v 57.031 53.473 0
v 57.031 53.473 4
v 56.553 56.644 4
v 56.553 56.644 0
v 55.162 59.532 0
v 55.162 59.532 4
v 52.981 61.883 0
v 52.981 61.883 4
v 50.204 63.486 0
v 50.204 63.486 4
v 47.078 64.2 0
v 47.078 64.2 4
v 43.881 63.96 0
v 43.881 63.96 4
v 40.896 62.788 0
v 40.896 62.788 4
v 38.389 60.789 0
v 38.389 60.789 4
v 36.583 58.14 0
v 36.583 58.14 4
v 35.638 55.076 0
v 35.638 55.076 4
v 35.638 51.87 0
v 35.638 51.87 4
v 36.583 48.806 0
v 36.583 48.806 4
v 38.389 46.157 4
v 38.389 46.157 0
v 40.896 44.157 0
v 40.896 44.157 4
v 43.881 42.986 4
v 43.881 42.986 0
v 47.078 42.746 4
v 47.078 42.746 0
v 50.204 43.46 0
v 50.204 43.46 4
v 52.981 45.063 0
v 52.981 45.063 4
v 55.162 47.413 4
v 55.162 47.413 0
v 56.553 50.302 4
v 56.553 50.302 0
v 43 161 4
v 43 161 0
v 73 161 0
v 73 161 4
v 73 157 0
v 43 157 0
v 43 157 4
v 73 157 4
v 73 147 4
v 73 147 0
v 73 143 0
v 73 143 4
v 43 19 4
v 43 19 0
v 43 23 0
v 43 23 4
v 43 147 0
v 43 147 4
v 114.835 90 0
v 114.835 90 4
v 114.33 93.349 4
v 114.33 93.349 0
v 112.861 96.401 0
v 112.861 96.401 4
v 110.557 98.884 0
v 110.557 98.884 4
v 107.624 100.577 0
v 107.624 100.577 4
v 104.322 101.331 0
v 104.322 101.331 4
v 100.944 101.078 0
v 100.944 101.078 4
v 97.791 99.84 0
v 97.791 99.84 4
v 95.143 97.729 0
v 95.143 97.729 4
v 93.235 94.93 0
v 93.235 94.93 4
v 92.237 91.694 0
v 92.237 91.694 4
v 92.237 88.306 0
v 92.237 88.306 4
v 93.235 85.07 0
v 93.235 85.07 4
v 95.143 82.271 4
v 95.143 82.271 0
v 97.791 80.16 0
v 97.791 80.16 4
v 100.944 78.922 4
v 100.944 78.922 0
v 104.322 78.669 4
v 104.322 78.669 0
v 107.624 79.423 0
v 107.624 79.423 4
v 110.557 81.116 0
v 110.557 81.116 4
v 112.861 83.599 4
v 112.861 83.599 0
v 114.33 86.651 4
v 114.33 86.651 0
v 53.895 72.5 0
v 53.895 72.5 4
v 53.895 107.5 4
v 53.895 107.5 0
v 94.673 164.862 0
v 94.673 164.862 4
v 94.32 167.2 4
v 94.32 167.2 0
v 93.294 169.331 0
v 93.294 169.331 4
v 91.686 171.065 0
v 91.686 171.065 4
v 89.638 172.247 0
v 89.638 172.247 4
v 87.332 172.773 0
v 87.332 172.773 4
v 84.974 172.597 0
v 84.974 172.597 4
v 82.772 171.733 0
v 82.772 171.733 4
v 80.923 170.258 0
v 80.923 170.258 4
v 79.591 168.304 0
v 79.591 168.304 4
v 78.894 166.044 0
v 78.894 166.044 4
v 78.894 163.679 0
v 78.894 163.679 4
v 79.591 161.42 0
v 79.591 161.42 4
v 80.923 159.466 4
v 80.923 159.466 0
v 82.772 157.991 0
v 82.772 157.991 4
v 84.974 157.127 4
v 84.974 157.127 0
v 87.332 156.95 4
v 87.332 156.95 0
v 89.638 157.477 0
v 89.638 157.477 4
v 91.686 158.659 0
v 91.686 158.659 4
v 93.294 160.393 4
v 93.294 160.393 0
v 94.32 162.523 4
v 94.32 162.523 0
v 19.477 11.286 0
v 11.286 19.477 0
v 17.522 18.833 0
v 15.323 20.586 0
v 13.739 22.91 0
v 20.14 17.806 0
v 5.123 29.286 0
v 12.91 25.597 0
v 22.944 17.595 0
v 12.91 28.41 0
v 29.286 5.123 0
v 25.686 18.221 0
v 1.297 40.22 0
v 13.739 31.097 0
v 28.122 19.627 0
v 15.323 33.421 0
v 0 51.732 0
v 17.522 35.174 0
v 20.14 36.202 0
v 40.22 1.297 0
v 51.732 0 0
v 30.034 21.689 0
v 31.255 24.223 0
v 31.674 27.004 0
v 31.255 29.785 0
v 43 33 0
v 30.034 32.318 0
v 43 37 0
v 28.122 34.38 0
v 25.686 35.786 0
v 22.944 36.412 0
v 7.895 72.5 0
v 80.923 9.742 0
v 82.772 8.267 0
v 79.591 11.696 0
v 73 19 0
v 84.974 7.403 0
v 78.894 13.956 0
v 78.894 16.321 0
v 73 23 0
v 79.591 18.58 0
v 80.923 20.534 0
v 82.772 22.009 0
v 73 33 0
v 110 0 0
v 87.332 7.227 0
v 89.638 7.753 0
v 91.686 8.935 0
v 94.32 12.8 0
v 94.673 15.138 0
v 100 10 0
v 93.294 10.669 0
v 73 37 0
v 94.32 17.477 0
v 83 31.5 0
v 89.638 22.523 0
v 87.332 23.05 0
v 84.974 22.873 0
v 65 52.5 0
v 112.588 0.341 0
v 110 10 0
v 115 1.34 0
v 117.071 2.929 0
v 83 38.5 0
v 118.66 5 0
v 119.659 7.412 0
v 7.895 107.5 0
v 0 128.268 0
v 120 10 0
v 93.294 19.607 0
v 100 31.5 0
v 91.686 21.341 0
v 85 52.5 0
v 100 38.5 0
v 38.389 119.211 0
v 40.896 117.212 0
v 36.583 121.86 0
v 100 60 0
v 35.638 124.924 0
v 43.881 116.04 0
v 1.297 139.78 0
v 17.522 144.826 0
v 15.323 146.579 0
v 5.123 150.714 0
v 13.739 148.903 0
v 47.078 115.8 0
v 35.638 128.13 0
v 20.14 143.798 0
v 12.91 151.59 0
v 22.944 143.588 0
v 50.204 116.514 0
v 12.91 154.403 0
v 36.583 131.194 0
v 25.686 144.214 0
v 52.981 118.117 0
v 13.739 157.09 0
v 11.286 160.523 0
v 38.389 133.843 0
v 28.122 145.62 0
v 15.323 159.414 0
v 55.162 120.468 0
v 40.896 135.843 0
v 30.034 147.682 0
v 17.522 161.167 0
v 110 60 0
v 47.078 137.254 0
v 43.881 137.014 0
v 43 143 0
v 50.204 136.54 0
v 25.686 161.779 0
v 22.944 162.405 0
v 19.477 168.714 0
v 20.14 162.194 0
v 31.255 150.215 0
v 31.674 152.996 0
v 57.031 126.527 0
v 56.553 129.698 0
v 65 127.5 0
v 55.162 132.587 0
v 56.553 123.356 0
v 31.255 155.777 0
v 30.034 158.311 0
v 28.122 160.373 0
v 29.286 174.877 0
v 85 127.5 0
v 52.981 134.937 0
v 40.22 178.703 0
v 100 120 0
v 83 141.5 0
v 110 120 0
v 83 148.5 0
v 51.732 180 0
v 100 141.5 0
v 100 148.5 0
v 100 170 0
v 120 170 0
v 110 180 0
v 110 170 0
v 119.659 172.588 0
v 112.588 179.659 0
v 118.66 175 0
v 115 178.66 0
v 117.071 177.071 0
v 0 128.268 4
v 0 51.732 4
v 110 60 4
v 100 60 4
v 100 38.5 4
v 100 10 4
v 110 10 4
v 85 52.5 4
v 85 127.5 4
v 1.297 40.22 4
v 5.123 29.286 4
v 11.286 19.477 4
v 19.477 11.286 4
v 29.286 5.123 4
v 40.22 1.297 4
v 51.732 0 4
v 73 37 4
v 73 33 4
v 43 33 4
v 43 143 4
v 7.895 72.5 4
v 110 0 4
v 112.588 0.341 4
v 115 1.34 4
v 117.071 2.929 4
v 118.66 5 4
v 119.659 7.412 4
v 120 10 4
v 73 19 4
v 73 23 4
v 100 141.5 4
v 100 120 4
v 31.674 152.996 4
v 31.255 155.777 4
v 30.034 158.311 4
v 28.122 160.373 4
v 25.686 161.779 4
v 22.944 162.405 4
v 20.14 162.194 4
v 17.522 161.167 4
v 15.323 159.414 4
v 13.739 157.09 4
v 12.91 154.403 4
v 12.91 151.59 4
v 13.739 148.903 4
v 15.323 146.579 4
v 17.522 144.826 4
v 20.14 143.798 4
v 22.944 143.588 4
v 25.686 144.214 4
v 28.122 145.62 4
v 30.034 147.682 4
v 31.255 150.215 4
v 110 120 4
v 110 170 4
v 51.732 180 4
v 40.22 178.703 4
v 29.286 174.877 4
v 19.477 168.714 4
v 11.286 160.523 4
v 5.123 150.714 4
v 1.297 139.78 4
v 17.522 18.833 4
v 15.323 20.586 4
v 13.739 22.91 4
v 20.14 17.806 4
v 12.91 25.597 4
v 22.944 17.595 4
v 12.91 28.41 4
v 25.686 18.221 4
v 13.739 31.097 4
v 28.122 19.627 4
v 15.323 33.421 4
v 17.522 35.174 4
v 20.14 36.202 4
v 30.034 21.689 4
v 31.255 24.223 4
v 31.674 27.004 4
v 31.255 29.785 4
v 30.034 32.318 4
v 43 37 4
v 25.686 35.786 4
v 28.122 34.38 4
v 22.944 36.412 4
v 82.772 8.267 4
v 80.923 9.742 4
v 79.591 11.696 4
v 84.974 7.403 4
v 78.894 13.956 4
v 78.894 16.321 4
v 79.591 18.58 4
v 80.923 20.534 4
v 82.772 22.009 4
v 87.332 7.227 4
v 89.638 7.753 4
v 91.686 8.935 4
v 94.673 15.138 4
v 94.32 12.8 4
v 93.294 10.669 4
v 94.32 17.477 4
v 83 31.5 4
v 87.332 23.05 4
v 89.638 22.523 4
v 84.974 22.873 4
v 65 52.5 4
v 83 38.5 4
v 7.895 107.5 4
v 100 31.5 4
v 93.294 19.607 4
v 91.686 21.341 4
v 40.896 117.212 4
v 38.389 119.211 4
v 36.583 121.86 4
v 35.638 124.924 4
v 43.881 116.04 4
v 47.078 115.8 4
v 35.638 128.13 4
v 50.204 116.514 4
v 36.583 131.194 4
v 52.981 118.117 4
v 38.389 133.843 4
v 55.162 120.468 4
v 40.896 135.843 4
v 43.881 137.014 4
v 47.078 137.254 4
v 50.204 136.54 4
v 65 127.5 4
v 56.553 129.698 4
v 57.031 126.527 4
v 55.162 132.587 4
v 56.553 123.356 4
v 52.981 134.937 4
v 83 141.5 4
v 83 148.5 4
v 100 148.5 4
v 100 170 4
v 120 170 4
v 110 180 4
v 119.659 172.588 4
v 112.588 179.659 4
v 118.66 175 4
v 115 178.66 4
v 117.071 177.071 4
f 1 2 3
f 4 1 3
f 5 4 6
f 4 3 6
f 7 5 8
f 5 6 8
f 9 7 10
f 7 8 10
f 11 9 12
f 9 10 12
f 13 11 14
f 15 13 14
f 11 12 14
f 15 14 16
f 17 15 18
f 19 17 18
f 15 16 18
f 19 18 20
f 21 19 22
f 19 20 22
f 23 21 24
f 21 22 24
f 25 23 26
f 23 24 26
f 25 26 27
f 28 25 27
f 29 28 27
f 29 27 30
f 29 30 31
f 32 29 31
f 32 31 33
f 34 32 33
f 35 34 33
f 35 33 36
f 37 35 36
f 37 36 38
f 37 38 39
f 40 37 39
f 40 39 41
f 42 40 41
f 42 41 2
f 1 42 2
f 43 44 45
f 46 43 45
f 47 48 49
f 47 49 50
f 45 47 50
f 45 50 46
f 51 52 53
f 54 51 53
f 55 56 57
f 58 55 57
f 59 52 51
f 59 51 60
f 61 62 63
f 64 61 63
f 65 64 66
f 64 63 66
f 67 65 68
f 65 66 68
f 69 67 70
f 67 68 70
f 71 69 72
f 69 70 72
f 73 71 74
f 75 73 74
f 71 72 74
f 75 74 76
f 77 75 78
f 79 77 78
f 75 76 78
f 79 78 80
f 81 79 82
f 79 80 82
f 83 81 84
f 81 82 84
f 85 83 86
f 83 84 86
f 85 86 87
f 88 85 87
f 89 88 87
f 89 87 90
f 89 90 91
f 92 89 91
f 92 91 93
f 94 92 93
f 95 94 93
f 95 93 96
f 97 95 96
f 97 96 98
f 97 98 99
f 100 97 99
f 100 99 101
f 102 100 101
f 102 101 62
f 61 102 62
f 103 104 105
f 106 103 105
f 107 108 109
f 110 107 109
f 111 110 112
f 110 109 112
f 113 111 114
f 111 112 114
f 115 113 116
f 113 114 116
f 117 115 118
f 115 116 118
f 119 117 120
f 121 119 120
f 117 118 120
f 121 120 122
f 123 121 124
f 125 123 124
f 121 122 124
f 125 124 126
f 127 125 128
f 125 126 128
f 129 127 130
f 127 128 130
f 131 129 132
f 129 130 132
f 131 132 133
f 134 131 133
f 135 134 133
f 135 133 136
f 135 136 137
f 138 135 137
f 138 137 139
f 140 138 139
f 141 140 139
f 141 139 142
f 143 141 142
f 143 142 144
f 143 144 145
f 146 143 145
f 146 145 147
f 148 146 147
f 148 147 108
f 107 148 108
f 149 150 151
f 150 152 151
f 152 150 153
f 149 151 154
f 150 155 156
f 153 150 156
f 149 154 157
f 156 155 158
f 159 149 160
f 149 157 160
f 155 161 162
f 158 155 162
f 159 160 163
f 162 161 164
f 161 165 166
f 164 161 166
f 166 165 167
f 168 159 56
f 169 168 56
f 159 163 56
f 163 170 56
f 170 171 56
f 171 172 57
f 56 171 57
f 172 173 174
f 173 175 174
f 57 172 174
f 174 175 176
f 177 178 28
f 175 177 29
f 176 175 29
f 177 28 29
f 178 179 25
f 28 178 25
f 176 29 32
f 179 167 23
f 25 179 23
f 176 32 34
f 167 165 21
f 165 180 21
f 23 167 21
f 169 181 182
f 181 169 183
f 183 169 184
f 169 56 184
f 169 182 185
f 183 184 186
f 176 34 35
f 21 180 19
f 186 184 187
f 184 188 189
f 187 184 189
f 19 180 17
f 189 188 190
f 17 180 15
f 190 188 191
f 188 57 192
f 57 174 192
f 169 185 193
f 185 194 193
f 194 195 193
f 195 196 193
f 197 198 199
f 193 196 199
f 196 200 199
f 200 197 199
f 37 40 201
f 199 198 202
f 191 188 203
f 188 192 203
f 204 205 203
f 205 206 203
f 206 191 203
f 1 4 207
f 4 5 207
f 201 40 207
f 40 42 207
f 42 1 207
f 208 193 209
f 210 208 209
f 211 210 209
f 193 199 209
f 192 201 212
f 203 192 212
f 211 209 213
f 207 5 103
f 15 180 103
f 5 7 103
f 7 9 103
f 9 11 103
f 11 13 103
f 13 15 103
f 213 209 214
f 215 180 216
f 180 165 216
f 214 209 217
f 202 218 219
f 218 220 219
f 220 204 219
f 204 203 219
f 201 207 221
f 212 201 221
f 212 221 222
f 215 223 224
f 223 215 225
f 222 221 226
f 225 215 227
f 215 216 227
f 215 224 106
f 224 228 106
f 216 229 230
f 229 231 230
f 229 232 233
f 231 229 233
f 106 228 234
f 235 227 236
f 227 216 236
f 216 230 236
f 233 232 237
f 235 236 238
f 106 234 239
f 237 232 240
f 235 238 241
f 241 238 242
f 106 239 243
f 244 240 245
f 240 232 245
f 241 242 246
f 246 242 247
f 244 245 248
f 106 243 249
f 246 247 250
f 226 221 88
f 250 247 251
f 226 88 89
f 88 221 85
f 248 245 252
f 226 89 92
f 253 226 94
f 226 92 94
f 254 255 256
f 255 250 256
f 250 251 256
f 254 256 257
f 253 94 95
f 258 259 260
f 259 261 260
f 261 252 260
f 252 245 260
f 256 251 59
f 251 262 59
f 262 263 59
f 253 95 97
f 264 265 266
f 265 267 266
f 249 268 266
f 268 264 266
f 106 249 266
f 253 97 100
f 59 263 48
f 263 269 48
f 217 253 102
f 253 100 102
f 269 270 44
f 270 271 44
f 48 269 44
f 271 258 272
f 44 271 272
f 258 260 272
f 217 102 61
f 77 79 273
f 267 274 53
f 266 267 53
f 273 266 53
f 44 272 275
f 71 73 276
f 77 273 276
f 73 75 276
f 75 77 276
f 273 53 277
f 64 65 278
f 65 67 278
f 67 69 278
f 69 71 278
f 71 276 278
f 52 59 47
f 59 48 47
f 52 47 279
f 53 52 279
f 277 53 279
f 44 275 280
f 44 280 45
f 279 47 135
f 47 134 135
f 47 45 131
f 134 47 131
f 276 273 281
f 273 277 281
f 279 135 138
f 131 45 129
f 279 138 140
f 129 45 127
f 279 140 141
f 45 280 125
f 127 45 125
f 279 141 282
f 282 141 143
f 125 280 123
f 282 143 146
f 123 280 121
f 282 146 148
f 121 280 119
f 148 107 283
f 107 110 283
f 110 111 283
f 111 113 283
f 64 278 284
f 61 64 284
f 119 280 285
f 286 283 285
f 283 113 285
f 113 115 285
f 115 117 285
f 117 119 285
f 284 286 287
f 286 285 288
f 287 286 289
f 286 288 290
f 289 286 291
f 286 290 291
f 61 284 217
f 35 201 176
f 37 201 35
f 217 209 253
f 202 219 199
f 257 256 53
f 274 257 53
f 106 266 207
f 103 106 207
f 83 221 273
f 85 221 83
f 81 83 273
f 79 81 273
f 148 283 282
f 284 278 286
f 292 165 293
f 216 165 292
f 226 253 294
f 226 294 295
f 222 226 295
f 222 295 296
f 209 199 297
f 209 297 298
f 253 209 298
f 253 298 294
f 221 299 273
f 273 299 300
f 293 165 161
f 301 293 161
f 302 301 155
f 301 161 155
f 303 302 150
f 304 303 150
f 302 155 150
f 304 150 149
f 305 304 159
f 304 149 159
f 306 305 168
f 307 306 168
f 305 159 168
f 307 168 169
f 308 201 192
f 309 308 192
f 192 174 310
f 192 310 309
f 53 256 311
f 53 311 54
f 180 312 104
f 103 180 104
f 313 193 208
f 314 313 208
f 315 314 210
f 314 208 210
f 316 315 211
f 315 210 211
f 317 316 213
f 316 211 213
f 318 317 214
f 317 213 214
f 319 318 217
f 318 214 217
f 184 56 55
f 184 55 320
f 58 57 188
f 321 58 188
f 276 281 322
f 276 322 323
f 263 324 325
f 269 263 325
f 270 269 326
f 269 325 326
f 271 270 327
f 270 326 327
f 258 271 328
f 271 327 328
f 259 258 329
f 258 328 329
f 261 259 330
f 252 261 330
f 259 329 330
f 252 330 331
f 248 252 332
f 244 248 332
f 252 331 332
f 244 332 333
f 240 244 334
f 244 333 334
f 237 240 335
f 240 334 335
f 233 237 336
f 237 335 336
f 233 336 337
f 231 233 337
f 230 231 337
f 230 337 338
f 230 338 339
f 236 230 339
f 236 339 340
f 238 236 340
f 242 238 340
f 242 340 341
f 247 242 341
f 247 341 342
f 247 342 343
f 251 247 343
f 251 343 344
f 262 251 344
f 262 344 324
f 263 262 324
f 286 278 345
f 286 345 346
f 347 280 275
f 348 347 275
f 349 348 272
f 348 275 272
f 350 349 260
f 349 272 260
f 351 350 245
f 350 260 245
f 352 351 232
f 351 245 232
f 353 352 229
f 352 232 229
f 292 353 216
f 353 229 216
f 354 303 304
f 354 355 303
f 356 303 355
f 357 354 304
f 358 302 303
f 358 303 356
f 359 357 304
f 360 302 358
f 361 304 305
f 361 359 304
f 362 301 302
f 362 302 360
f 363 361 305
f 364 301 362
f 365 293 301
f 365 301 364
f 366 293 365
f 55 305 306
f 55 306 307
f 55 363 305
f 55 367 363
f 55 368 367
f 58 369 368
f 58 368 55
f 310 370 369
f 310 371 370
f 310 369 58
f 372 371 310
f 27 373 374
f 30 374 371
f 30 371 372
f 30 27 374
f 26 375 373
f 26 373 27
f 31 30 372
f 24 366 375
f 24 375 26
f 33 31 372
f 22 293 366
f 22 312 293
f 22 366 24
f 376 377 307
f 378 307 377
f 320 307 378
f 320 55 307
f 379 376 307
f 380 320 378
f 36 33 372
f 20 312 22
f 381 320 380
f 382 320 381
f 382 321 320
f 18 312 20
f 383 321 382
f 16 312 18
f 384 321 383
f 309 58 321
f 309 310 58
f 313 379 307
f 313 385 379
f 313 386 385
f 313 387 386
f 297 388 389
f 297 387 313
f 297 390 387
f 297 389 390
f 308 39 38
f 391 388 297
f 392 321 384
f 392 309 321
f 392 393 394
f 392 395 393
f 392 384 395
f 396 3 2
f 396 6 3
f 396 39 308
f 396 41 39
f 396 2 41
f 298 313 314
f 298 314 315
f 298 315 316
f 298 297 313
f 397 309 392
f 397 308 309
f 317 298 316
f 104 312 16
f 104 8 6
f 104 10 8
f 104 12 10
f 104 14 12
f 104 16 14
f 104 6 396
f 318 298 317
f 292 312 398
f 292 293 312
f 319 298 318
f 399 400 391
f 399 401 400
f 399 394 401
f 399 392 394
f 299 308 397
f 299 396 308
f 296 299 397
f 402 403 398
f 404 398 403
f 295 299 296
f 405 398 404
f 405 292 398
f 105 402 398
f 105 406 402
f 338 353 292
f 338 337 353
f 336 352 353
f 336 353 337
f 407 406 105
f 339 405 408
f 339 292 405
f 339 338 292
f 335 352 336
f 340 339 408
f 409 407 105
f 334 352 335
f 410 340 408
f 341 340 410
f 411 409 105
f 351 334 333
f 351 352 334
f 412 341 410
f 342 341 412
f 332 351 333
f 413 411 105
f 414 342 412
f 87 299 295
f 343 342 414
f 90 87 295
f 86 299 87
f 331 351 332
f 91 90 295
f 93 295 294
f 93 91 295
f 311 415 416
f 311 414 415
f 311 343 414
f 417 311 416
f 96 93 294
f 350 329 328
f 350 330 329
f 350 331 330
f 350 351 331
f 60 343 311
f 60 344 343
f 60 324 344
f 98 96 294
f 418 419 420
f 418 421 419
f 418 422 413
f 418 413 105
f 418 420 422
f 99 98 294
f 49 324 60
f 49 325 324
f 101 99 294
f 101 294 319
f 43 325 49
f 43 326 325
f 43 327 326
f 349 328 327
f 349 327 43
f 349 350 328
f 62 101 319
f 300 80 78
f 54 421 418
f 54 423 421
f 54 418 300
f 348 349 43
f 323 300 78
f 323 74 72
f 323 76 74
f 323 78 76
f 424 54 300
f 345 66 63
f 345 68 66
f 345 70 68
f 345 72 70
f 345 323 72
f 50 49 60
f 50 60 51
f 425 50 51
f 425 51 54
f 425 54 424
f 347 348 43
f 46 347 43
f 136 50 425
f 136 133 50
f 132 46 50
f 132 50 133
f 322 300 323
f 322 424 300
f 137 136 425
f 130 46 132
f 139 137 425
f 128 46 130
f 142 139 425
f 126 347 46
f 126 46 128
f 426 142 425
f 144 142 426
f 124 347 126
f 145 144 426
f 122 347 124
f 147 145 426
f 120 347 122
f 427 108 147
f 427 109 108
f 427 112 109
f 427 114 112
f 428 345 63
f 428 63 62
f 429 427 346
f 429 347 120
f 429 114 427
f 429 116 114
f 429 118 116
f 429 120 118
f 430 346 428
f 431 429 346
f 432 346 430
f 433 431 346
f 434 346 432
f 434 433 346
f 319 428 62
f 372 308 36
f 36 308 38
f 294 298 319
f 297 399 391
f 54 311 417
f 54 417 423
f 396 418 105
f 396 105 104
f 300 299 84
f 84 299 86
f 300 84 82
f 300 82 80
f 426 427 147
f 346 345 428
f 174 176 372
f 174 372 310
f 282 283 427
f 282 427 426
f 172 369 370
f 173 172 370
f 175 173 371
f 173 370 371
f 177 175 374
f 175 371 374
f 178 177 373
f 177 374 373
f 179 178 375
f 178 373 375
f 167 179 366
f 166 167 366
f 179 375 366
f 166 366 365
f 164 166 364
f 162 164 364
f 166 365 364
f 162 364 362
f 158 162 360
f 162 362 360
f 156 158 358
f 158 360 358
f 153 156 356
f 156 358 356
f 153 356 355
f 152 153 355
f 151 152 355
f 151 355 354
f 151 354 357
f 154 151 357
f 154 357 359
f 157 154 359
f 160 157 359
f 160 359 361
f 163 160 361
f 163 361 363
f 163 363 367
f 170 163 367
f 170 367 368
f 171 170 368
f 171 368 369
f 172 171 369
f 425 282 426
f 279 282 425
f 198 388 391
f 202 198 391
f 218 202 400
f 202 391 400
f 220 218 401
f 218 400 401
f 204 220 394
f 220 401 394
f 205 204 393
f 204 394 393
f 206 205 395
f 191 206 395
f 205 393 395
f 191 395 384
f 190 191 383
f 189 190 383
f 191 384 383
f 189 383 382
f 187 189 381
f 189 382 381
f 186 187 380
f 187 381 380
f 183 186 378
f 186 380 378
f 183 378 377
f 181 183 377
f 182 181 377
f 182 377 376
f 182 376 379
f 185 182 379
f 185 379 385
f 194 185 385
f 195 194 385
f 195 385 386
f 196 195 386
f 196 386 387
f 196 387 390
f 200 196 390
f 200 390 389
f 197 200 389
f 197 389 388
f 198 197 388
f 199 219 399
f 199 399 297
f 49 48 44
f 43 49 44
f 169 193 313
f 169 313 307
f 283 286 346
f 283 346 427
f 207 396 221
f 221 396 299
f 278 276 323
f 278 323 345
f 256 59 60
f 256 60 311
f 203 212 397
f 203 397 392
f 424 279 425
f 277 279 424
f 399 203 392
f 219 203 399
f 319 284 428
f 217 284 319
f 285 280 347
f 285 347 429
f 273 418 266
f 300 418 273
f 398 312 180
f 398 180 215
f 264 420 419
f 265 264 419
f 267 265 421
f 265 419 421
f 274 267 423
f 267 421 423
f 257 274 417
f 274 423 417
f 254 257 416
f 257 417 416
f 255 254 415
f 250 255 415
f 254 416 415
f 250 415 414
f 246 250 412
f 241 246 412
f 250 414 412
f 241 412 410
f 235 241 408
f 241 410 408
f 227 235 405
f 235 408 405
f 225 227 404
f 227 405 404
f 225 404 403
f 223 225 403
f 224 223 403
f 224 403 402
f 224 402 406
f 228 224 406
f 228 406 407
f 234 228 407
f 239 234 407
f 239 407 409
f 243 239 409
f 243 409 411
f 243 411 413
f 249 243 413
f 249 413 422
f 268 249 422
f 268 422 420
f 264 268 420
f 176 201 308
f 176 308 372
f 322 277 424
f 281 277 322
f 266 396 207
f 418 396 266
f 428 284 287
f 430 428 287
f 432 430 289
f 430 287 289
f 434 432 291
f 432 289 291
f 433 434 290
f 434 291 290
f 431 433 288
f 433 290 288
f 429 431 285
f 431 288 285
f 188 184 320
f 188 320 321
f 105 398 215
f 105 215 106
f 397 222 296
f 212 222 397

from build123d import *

# Parameters (mm, degrees)
SKETCH001_W     = 30
SKETCH001_H     = 4
PAD_DEPTH       = 4
SKETCH002_W     = 20
SKETCH002_H     = 75
SKETCH002_W_2   = 46
SKETCH002_H_2   = 35
POCKET_DEPTH    = 5
SKETCH003_R     = 10.756675
SKETCH003_R_2   = 11.362787
SKETCH003_R_3   = 7.933722
SKETCH003_R_4   = 9.434644
POCKET001_DEPTH = 5


with BuildPart() as part:
    # Sketch001 → Pad (new body)
    with BuildSketch(Plane.XY):
        with BuildLine():
            Line((0, 90), (0, 128.268396))
            ThreePointArc((51.731604, 180), (15.151836, 164.848164), (0, 128.268396))
            Line((51.731604, 180), (110, 180))
            ThreePointArc((120, 170), (117.071068, 177.071068), (110, 180))
            Line((120, 170), (120, 10))
            ThreePointArc((110, 0), (117.071068, 2.928932), (120, 10))
            Line((110, 0), (51.731604, 0))
            ThreePointArc((0, 51.731604), (15.151836, 15.151836), (51.731604, 0))
            Line((0, 51.731604), (0, 90))
        make_face()
        Polygon((100, 60), (100, 38.5), (83, 38.5), (83, 31.5), (100, 31.5), (100, 10), (110, 10), (110, 60), align=None, mode=Mode.SUBTRACT)
        Polygon((100, 120), (110, 120), (110, 170), (100, 170), (100, 148.5), (83, 148.5), (83, 141.5), (100, 141.5), align=None, mode=Mode.SUBTRACT)
        Polygon((73, 37), (43, 37), (43, 33), (73, 33), (73, 35), align=None, mode=Mode.SUBTRACT)
        Polygon((73, 145), (73, 147), (43, 147), (43, 143), (73, 143), align=None, mode=Mode.SUBTRACT)
        with Locations((58, 159)):
            Rectangle(SKETCH001_W, SKETCH001_H, mode=Mode.SUBTRACT)
        with Locations((58, 21)):
            Rectangle(SKETCH001_W, SKETCH001_H, mode=Mode.SUBTRACT)
    extrude(amount=PAD_DEPTH)

    # Sketch002 (on Face45 of Pad) → Pocket (cut)
    with BuildSketch(Plane.XY.offset(4)):
        with Locations((75, 90)):
            Rectangle(SKETCH002_W, SKETCH002_H)
        with Locations((30.894964, 90)):
            Rectangle(SKETCH002_W_2, SKETCH002_H_2)
    extrude(amount=-POCKET_DEPTH, mode=Mode.SUBTRACT)

    # Sketch003 (on Face5 of Pocket) → Pocket001 (cut)
    with BuildSketch(Plane.XY.offset(4)):
        with Locations((46.274479, 126.527054)):
            Circle(SKETCH003_R)
        with Locations((46.274479, 53.472946)):
            Circle(SKETCH003_R)
        with Locations((103.472527, 90)):
            Circle(SKETCH003_R_2)
        with Locations((86.739067, 164.861923)):
            Circle(SKETCH003_R_3)
        with Locations((86.739067, 15.138077)):
            Circle(SKETCH003_R_3)
        with Locations((22.239138, 27.003632)):
            Circle(SKETCH003_R_4)
        with Locations((22.239138, 152.996368)):
            Circle(SKETCH003_R_4)
    extrude(amount=-POCKET001_DEPTH, mode=Mode.SUBTRACT)


solid = part.part
